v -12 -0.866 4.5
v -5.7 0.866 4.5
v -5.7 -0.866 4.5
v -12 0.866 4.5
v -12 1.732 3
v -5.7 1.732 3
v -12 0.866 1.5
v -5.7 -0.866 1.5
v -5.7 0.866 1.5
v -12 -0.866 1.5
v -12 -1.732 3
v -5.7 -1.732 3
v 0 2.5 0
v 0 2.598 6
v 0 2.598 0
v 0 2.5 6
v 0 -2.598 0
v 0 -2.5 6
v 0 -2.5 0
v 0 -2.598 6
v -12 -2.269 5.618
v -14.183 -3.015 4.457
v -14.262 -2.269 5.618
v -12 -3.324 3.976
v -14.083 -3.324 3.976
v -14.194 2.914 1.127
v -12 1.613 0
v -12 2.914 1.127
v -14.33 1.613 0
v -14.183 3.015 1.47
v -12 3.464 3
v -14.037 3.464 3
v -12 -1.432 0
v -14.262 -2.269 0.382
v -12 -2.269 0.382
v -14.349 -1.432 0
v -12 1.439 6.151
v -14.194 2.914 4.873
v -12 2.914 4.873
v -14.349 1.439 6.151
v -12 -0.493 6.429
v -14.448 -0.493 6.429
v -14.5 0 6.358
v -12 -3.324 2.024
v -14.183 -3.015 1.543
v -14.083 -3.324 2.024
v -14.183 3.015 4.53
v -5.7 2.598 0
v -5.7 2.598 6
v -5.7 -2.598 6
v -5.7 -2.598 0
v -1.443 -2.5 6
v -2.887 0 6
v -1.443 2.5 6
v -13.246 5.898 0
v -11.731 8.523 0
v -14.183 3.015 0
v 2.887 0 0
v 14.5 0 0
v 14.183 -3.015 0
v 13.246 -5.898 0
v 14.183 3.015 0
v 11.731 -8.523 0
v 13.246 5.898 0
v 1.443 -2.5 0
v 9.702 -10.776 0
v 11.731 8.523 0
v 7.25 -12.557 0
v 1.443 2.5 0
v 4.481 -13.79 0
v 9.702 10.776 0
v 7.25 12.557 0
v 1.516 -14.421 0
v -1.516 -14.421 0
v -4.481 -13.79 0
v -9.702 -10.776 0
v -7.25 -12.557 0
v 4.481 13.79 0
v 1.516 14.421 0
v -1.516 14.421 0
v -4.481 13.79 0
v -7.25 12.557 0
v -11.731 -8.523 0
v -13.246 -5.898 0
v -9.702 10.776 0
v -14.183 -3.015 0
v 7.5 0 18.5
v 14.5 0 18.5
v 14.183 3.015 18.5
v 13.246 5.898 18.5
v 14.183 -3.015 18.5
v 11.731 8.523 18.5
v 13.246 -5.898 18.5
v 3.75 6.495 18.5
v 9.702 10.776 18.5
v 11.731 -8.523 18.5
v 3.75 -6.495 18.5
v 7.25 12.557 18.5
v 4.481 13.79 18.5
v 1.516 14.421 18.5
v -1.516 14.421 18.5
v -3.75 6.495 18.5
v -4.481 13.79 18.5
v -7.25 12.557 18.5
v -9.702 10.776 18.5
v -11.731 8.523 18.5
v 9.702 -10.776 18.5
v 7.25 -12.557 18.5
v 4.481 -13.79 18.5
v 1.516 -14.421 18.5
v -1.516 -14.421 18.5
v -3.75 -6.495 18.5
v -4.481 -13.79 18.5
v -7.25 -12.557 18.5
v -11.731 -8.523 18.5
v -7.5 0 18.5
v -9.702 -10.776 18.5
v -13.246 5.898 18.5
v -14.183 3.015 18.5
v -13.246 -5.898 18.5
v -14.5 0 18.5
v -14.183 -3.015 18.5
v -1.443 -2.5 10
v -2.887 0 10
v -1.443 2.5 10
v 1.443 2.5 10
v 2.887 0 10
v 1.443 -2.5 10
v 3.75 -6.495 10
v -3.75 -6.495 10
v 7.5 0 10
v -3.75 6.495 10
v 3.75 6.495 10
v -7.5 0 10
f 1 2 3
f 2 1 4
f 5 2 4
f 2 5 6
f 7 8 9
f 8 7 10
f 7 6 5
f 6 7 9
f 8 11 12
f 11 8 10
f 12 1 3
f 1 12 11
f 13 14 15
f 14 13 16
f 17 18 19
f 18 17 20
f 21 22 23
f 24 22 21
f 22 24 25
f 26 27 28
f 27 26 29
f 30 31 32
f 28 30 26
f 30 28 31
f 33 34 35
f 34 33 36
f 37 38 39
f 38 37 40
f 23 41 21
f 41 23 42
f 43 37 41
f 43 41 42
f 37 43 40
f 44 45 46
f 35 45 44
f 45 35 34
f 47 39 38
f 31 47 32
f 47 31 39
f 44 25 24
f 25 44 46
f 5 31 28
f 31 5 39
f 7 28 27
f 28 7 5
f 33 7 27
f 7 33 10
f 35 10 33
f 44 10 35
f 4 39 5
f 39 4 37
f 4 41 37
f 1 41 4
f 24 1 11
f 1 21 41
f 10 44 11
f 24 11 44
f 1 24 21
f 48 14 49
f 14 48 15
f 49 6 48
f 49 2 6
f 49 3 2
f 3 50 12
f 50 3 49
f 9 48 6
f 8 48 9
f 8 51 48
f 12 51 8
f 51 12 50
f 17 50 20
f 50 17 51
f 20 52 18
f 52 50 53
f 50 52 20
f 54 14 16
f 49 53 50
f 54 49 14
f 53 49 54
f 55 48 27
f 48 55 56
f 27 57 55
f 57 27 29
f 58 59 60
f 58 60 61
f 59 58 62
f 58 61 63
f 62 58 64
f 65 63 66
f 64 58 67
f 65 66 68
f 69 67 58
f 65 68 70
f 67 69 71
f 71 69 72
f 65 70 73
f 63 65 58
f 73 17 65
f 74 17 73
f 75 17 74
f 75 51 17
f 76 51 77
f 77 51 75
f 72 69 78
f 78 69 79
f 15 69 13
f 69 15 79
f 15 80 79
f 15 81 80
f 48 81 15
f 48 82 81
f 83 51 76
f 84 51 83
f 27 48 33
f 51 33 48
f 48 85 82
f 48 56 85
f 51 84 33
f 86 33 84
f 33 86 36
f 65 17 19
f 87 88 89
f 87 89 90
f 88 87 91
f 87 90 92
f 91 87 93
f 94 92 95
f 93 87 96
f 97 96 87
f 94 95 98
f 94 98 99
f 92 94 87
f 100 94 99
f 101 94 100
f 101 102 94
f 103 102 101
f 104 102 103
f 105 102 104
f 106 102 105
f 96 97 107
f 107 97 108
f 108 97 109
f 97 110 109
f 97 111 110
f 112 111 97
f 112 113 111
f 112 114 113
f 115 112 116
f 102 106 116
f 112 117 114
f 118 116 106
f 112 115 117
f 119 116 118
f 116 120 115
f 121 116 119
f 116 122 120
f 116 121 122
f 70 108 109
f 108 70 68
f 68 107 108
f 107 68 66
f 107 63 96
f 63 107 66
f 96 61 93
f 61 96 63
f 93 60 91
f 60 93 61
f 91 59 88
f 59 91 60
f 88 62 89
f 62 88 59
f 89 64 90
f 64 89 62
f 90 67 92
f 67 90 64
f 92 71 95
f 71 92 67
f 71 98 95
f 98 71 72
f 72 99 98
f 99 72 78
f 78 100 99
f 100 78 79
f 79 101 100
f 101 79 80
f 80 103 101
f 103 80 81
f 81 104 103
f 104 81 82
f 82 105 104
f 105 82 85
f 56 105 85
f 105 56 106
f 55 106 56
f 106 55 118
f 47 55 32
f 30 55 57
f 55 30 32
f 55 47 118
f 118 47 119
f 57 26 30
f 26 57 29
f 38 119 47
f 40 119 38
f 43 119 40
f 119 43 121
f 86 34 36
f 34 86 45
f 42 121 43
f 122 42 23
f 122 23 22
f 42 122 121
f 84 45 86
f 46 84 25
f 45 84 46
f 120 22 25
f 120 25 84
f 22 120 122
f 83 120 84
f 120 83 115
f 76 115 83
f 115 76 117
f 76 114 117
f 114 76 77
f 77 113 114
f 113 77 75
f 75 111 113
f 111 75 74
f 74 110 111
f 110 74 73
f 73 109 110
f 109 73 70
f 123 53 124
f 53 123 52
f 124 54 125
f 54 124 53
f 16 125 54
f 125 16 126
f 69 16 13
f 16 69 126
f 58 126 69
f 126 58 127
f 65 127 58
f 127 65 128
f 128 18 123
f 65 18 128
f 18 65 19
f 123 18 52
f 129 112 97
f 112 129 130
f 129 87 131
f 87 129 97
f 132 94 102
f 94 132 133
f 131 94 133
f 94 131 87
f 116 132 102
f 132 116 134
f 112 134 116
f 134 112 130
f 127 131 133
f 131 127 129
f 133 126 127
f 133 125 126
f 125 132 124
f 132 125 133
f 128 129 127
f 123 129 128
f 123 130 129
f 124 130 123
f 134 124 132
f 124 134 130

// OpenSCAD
// file: wallace.scad
rod_size = 8;
rod_nut_size = 15; //12 for M6, 15 for M8
bearing_size = 15.5; //12.5 for LM6UU, 15.5 for LM8UU,LM8SUU
bearing_length = 24.5; //19.5 for LM6UU, 17.5 for LM8SUU, 24.5 for LM8UU
yz_motor_distance = 25;
motor_screw_spacing = 31; //26 for NEMA14, 31 for NEMA17
motor_casing = 45; //38 for NEMA14, 45 for NEMA17
end_height = 55; //measure the height of your motor casing and add 4mm. Suggestion: 40 for NEMA14, 55 for NEMA17
bed_mount_height = 16;
//x_rod_spacing = motor_screw_spacing + 3 + rod_size;
x_rod_spacing = 30;
x_carriage_width = 70;
carriage_extruder_offset = 5;
pulley_size = 20;
idler_pulley_width = 10;
gusset_size = 15;
m3_size = 3;
m3_nut_size = 6;
m4_size = 4;
motor_shaft_size = 5;
// ratio for converting diameter to apothem
da6 = 1 / cos(180 / 6) / 2;
da8 = 1 / cos(180 / 8) / 2;
// main file
include <wallace.scad>;
difference() {
	linear_extrude(height = 10 + rod_nut_size / 2 + 1, convexity = 5) difference() {
		circle(motor_screw_spacing / 2 - 1);
		circle(motor_shaft_size * da6, $fn = 6);
	}
	translate([0, 0, m3_nut_size / 2]) rotate([-90, 0, 90]) {
		cylinder(r = m3_size * da6, h = motor_screw_spacing / 2 + 1);
		%rotate(90) cylinder(r = m3_nut_size / 2, h = 5.5, $fn = 6);
		translate([0, 0, 12]) cylinder(r = m3_size * da6 * 2, h = motor_screw_spacing / 2);
		translate([-m3_nut_size / da6 / 4, -m3_nut_size / 2, 0]) cube([m3_nut_size / da6 / 2, m3_nut_size + 1, 5.7]);
	}
	translate([0, 0, 10]) cylinder(r = rod_nut_size / 2, h = rod_nut_size + 1, $fn = 6);
	//translate([0, 0, -1]) cube(100);
}
